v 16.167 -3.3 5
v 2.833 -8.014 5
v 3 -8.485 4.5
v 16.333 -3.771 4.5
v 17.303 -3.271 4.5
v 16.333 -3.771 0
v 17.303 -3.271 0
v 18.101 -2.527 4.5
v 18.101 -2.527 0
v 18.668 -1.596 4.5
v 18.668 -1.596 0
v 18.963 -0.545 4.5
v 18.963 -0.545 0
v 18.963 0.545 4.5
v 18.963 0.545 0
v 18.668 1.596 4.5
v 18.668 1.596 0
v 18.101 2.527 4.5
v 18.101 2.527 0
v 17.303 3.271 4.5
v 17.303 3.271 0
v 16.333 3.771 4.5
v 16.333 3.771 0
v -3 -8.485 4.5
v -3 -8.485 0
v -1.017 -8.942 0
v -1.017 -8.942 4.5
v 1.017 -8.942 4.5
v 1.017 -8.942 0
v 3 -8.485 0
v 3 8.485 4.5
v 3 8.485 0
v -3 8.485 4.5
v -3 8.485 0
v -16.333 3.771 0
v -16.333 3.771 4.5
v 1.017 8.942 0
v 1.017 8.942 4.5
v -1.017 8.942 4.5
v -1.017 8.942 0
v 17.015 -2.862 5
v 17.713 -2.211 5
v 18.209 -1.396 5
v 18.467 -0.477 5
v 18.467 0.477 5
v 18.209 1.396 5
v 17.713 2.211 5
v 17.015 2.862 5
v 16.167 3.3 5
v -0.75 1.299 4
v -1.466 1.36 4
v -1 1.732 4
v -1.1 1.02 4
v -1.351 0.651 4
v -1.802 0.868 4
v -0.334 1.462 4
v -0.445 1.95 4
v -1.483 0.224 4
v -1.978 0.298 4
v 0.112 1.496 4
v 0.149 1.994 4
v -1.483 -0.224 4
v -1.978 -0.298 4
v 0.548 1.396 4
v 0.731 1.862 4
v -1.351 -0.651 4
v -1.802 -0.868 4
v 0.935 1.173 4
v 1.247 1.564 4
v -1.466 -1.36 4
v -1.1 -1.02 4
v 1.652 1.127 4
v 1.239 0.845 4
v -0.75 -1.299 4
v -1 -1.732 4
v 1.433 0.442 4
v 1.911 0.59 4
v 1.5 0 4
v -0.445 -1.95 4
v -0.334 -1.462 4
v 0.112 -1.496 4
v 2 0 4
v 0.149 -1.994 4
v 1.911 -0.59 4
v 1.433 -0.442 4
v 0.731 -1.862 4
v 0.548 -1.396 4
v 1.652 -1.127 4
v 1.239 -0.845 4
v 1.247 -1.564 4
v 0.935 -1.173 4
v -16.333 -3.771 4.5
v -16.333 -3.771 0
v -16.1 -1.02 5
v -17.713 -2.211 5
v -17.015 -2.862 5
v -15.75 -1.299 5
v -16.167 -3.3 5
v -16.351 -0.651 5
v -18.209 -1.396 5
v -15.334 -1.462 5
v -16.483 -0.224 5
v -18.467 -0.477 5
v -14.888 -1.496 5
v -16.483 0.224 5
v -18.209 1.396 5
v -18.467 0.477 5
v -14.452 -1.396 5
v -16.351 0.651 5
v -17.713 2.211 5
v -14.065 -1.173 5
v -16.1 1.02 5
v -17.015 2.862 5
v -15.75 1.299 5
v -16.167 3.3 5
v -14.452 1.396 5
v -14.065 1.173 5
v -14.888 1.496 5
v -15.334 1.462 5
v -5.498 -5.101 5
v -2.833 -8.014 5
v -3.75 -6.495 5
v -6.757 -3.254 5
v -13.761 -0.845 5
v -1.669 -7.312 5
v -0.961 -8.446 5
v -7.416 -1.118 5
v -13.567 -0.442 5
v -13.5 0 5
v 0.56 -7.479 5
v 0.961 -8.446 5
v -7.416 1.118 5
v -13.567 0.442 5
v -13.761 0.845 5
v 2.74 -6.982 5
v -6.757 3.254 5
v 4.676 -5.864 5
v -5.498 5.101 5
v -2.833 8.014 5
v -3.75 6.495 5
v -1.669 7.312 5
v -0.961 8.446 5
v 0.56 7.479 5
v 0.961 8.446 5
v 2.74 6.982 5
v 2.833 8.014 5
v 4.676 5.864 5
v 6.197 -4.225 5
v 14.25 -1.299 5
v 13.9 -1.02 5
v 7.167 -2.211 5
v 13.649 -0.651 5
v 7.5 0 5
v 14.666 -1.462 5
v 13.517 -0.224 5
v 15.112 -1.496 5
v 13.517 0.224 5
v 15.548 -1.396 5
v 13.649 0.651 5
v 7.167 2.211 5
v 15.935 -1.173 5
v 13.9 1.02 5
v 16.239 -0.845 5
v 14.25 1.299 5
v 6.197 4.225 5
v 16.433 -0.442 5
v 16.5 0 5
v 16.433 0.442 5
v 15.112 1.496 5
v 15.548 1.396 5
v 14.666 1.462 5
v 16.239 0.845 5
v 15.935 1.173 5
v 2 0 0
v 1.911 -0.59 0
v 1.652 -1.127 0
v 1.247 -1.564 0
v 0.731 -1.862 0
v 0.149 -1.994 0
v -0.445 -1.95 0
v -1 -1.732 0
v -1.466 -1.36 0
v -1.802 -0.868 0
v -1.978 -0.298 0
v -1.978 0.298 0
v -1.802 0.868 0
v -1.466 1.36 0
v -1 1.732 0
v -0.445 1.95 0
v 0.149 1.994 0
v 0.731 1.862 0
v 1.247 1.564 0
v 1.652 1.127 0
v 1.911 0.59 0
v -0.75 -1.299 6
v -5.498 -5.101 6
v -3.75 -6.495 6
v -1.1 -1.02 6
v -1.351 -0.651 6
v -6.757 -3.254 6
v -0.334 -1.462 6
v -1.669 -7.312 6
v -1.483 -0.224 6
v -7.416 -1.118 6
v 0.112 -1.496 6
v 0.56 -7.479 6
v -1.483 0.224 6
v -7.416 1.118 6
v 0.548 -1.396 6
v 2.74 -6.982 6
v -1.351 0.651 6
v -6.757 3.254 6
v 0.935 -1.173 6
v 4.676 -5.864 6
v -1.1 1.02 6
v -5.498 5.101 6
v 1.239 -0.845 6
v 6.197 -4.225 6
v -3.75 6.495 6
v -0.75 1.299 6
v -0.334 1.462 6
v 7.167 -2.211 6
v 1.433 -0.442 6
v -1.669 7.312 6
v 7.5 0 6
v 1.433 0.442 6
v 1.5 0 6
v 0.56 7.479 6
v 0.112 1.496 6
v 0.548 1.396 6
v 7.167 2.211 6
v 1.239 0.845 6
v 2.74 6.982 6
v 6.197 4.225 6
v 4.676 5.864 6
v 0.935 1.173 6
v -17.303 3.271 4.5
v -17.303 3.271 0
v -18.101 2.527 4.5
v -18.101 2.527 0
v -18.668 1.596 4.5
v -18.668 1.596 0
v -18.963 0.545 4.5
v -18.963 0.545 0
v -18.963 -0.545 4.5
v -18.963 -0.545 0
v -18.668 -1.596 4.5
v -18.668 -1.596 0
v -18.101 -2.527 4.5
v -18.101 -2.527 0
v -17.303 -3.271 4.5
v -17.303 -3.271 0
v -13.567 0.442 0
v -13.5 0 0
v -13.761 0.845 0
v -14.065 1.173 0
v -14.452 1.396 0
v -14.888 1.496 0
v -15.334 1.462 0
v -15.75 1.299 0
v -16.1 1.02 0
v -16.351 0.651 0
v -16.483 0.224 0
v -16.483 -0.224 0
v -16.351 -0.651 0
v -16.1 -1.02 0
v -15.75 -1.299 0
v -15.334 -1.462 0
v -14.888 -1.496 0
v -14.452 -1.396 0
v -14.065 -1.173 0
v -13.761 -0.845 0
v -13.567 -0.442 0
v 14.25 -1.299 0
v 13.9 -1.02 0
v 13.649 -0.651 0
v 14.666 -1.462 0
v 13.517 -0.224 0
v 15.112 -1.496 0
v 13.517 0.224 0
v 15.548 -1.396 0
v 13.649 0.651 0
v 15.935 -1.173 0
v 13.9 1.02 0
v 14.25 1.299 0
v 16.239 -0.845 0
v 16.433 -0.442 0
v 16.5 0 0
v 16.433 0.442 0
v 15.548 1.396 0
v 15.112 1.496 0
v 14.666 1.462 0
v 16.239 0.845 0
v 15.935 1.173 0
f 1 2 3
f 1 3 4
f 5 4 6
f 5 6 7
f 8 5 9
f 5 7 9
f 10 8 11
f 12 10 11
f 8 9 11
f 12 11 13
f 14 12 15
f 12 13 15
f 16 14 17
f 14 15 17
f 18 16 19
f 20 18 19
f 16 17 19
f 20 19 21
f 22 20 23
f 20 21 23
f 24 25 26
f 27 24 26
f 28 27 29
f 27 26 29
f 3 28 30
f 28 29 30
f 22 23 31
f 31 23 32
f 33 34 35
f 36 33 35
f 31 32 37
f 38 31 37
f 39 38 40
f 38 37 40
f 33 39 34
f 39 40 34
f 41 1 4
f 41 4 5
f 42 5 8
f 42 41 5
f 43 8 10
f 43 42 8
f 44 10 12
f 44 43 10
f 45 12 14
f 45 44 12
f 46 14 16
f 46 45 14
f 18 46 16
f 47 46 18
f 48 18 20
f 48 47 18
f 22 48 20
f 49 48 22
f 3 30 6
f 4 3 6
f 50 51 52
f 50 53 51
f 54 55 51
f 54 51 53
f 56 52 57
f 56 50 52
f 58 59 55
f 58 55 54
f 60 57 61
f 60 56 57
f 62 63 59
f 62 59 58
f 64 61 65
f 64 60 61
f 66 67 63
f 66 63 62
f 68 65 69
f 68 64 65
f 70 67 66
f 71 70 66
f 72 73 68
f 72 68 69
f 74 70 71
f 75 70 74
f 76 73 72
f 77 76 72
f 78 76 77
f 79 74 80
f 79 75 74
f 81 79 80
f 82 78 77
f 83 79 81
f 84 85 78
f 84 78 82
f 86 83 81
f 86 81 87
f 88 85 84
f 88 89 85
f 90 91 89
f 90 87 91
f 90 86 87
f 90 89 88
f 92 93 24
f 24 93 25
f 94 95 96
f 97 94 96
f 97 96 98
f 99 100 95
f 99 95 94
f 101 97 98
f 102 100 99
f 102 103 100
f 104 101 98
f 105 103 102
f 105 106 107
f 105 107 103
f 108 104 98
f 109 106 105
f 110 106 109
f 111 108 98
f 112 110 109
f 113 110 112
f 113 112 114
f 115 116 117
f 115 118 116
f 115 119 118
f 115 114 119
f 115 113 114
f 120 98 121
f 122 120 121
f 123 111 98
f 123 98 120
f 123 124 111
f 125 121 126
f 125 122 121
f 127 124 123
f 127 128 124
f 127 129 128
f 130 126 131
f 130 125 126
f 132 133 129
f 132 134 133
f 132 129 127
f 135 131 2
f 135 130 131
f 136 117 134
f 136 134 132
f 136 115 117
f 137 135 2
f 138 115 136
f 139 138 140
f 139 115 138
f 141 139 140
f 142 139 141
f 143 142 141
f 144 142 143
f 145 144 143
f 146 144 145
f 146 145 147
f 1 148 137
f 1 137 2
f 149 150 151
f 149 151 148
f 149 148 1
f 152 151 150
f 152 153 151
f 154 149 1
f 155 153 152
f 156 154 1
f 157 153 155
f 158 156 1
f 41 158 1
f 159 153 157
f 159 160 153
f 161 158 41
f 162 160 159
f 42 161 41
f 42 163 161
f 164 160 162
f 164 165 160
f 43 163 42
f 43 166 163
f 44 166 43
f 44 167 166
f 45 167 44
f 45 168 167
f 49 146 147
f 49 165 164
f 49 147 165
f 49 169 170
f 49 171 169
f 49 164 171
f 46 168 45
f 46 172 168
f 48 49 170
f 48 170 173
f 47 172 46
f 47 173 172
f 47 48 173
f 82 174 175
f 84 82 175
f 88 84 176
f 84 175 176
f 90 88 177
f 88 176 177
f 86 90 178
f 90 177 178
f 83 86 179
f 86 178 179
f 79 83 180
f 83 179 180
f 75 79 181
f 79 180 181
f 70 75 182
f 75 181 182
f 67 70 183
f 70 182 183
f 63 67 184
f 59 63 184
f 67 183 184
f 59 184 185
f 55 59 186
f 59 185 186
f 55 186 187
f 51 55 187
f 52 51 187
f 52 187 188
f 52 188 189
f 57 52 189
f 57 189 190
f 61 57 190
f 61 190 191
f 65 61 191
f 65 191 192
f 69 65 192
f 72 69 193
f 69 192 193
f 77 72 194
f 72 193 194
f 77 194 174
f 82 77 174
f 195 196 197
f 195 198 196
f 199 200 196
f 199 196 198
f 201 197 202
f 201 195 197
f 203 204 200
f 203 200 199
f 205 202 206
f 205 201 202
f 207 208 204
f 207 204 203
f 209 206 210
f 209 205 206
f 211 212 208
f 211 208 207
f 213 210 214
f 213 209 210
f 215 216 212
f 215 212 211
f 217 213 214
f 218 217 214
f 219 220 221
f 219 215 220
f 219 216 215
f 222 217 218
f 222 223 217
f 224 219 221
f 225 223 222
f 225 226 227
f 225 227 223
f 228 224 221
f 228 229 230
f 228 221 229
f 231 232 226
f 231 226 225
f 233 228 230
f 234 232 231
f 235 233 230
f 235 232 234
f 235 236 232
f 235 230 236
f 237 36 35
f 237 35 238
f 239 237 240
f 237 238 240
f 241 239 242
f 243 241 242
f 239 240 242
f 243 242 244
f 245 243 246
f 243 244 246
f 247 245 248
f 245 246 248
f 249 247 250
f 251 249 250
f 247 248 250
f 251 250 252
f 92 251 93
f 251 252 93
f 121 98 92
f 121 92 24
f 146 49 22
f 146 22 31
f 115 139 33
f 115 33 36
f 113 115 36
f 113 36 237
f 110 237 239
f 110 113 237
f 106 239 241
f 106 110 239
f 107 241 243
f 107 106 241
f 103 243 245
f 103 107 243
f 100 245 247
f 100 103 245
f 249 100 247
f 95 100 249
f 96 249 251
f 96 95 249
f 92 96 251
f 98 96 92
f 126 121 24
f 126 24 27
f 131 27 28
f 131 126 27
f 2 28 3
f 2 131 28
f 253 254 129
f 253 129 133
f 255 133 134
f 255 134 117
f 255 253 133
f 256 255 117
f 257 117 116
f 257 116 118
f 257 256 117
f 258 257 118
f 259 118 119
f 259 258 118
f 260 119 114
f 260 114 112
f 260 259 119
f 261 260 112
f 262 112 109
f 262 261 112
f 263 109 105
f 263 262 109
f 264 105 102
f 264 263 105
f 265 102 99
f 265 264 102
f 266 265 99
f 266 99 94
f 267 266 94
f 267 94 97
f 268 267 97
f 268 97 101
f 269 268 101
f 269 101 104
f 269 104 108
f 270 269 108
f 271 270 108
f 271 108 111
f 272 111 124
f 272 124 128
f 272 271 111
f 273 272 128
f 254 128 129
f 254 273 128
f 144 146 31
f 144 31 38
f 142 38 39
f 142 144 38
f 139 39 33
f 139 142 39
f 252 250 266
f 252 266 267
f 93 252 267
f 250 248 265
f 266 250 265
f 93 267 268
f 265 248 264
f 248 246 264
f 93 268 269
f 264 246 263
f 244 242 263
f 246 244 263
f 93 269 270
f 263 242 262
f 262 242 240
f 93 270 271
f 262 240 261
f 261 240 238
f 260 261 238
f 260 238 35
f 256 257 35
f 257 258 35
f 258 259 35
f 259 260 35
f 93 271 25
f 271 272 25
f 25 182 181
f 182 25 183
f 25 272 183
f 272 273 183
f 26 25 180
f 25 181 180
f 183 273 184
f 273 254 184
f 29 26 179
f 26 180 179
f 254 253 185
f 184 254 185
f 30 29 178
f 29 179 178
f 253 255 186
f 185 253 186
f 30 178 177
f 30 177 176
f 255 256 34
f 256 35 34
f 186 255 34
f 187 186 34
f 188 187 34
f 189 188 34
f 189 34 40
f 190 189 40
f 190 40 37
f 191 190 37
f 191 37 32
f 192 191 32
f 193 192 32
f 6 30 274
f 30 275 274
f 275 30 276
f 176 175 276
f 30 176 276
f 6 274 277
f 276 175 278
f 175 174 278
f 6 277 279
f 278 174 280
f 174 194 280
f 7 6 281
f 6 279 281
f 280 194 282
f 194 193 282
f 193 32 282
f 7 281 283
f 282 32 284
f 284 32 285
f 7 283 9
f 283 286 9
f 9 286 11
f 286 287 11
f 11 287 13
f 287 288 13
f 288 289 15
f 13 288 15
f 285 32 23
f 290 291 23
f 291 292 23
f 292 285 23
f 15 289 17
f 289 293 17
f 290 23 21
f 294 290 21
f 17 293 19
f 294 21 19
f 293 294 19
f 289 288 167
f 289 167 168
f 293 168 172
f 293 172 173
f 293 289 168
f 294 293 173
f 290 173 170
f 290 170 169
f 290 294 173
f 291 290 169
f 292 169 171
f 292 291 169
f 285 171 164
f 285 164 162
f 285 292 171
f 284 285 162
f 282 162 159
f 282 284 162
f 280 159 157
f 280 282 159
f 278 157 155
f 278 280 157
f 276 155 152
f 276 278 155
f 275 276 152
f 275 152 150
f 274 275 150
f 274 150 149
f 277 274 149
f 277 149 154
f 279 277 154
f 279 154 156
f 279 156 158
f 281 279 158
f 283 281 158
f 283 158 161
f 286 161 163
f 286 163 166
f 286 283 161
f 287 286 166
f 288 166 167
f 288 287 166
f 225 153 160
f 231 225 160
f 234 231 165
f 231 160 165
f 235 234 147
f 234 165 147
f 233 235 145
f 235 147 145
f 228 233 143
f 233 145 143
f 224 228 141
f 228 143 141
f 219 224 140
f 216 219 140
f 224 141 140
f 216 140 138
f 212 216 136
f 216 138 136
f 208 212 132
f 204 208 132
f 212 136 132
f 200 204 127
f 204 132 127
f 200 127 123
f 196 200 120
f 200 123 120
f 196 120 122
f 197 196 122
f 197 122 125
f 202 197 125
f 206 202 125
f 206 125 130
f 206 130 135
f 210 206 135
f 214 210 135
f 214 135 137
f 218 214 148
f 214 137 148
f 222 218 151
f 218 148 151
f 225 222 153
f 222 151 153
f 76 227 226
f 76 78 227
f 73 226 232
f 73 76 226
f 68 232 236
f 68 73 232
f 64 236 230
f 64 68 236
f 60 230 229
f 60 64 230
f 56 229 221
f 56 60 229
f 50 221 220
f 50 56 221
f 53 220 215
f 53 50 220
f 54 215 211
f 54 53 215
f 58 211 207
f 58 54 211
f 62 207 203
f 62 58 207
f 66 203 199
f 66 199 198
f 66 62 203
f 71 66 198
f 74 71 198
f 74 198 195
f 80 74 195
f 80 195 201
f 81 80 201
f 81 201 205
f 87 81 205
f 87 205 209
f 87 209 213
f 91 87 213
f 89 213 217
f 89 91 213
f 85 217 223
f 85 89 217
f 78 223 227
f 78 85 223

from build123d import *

# Parameters (mm, degrees)
F0_R     = 1.5
F1_DEPTH = 5
F2_R     = 1.5
F3_DEPTH = 5.001
F4_R     = 2
F5_DEPTH = 4
F6_R     = 7.5
F6_R_2   = 1.5
F7_DEPTH = 1
F8_SIZE  = 0.5


with BuildPart() as f1:
    # F0 (on Top) → F1 (new body)
    with BuildSketch(Plane.XY):
        with BuildLine():
            Line((-3, 8.485281), (-16.333333, 3.771236))
            ThreePointArc((-16.333333, 3.771236), (-19, 0), (-16.333333, -3.771236))
            Line((-16.333333, -3.771236), (-3, -8.485281))
            ThreePointArc((-3, -8.485281), (0, -9), (3, -8.485281))
            Line((3, -8.485281), (16.333333, -3.771236))
            ThreePointArc((16.333333, -3.771236), (19, 0), (16.333333, 3.771236))
            Line((16.333333, 3.771236), (3, 8.485281))
            ThreePointArc((3, 8.485281), (0, 9), (-3, 8.485281))
        make_face()
        with Locations((-15, 0)):
            Circle(F0_R, mode=Mode.SUBTRACT)
        with Locations((15, 0)):
            Circle(F0_R, mode=Mode.SUBTRACT)
    extrude(amount=F1_DEPTH)

    # F2 (on face) → F3 (cut, through all)
    with BuildSketch(Plane(origin=(0, 0, 0), x_dir=(1, 0, 0), z_dir=(0, 0, -1))):
        Circle(F2_R)
    extrude(amount=-F3_DEPTH, mode=Mode.SUBTRACT)

    # F4 (on face) → F5 (cut)
    with BuildSketch(Plane(origin=(0, 0, 0), x_dir=(1, 0, 0), z_dir=(0, 0, -1))):
        Circle(F4_R)
    extrude(amount=-F5_DEPTH, mode=Mode.SUBTRACT)

    # F6 (on face) → F7 (join)
    with BuildSketch(Plane.XY.offset(5)):
        Circle(F6_R)
        Circle(F6_R_2, mode=Mode.SUBTRACT)
    extrude(amount=F7_DEPTH)

    # F8
    f8_edges = [f1.edges().sort_by_distance(p)[0] for p in [
        (9.666667, 6.128259, 5),
    ]]
    chamfer(f8_edges, length=F8_SIZE)


solid = f1.part
